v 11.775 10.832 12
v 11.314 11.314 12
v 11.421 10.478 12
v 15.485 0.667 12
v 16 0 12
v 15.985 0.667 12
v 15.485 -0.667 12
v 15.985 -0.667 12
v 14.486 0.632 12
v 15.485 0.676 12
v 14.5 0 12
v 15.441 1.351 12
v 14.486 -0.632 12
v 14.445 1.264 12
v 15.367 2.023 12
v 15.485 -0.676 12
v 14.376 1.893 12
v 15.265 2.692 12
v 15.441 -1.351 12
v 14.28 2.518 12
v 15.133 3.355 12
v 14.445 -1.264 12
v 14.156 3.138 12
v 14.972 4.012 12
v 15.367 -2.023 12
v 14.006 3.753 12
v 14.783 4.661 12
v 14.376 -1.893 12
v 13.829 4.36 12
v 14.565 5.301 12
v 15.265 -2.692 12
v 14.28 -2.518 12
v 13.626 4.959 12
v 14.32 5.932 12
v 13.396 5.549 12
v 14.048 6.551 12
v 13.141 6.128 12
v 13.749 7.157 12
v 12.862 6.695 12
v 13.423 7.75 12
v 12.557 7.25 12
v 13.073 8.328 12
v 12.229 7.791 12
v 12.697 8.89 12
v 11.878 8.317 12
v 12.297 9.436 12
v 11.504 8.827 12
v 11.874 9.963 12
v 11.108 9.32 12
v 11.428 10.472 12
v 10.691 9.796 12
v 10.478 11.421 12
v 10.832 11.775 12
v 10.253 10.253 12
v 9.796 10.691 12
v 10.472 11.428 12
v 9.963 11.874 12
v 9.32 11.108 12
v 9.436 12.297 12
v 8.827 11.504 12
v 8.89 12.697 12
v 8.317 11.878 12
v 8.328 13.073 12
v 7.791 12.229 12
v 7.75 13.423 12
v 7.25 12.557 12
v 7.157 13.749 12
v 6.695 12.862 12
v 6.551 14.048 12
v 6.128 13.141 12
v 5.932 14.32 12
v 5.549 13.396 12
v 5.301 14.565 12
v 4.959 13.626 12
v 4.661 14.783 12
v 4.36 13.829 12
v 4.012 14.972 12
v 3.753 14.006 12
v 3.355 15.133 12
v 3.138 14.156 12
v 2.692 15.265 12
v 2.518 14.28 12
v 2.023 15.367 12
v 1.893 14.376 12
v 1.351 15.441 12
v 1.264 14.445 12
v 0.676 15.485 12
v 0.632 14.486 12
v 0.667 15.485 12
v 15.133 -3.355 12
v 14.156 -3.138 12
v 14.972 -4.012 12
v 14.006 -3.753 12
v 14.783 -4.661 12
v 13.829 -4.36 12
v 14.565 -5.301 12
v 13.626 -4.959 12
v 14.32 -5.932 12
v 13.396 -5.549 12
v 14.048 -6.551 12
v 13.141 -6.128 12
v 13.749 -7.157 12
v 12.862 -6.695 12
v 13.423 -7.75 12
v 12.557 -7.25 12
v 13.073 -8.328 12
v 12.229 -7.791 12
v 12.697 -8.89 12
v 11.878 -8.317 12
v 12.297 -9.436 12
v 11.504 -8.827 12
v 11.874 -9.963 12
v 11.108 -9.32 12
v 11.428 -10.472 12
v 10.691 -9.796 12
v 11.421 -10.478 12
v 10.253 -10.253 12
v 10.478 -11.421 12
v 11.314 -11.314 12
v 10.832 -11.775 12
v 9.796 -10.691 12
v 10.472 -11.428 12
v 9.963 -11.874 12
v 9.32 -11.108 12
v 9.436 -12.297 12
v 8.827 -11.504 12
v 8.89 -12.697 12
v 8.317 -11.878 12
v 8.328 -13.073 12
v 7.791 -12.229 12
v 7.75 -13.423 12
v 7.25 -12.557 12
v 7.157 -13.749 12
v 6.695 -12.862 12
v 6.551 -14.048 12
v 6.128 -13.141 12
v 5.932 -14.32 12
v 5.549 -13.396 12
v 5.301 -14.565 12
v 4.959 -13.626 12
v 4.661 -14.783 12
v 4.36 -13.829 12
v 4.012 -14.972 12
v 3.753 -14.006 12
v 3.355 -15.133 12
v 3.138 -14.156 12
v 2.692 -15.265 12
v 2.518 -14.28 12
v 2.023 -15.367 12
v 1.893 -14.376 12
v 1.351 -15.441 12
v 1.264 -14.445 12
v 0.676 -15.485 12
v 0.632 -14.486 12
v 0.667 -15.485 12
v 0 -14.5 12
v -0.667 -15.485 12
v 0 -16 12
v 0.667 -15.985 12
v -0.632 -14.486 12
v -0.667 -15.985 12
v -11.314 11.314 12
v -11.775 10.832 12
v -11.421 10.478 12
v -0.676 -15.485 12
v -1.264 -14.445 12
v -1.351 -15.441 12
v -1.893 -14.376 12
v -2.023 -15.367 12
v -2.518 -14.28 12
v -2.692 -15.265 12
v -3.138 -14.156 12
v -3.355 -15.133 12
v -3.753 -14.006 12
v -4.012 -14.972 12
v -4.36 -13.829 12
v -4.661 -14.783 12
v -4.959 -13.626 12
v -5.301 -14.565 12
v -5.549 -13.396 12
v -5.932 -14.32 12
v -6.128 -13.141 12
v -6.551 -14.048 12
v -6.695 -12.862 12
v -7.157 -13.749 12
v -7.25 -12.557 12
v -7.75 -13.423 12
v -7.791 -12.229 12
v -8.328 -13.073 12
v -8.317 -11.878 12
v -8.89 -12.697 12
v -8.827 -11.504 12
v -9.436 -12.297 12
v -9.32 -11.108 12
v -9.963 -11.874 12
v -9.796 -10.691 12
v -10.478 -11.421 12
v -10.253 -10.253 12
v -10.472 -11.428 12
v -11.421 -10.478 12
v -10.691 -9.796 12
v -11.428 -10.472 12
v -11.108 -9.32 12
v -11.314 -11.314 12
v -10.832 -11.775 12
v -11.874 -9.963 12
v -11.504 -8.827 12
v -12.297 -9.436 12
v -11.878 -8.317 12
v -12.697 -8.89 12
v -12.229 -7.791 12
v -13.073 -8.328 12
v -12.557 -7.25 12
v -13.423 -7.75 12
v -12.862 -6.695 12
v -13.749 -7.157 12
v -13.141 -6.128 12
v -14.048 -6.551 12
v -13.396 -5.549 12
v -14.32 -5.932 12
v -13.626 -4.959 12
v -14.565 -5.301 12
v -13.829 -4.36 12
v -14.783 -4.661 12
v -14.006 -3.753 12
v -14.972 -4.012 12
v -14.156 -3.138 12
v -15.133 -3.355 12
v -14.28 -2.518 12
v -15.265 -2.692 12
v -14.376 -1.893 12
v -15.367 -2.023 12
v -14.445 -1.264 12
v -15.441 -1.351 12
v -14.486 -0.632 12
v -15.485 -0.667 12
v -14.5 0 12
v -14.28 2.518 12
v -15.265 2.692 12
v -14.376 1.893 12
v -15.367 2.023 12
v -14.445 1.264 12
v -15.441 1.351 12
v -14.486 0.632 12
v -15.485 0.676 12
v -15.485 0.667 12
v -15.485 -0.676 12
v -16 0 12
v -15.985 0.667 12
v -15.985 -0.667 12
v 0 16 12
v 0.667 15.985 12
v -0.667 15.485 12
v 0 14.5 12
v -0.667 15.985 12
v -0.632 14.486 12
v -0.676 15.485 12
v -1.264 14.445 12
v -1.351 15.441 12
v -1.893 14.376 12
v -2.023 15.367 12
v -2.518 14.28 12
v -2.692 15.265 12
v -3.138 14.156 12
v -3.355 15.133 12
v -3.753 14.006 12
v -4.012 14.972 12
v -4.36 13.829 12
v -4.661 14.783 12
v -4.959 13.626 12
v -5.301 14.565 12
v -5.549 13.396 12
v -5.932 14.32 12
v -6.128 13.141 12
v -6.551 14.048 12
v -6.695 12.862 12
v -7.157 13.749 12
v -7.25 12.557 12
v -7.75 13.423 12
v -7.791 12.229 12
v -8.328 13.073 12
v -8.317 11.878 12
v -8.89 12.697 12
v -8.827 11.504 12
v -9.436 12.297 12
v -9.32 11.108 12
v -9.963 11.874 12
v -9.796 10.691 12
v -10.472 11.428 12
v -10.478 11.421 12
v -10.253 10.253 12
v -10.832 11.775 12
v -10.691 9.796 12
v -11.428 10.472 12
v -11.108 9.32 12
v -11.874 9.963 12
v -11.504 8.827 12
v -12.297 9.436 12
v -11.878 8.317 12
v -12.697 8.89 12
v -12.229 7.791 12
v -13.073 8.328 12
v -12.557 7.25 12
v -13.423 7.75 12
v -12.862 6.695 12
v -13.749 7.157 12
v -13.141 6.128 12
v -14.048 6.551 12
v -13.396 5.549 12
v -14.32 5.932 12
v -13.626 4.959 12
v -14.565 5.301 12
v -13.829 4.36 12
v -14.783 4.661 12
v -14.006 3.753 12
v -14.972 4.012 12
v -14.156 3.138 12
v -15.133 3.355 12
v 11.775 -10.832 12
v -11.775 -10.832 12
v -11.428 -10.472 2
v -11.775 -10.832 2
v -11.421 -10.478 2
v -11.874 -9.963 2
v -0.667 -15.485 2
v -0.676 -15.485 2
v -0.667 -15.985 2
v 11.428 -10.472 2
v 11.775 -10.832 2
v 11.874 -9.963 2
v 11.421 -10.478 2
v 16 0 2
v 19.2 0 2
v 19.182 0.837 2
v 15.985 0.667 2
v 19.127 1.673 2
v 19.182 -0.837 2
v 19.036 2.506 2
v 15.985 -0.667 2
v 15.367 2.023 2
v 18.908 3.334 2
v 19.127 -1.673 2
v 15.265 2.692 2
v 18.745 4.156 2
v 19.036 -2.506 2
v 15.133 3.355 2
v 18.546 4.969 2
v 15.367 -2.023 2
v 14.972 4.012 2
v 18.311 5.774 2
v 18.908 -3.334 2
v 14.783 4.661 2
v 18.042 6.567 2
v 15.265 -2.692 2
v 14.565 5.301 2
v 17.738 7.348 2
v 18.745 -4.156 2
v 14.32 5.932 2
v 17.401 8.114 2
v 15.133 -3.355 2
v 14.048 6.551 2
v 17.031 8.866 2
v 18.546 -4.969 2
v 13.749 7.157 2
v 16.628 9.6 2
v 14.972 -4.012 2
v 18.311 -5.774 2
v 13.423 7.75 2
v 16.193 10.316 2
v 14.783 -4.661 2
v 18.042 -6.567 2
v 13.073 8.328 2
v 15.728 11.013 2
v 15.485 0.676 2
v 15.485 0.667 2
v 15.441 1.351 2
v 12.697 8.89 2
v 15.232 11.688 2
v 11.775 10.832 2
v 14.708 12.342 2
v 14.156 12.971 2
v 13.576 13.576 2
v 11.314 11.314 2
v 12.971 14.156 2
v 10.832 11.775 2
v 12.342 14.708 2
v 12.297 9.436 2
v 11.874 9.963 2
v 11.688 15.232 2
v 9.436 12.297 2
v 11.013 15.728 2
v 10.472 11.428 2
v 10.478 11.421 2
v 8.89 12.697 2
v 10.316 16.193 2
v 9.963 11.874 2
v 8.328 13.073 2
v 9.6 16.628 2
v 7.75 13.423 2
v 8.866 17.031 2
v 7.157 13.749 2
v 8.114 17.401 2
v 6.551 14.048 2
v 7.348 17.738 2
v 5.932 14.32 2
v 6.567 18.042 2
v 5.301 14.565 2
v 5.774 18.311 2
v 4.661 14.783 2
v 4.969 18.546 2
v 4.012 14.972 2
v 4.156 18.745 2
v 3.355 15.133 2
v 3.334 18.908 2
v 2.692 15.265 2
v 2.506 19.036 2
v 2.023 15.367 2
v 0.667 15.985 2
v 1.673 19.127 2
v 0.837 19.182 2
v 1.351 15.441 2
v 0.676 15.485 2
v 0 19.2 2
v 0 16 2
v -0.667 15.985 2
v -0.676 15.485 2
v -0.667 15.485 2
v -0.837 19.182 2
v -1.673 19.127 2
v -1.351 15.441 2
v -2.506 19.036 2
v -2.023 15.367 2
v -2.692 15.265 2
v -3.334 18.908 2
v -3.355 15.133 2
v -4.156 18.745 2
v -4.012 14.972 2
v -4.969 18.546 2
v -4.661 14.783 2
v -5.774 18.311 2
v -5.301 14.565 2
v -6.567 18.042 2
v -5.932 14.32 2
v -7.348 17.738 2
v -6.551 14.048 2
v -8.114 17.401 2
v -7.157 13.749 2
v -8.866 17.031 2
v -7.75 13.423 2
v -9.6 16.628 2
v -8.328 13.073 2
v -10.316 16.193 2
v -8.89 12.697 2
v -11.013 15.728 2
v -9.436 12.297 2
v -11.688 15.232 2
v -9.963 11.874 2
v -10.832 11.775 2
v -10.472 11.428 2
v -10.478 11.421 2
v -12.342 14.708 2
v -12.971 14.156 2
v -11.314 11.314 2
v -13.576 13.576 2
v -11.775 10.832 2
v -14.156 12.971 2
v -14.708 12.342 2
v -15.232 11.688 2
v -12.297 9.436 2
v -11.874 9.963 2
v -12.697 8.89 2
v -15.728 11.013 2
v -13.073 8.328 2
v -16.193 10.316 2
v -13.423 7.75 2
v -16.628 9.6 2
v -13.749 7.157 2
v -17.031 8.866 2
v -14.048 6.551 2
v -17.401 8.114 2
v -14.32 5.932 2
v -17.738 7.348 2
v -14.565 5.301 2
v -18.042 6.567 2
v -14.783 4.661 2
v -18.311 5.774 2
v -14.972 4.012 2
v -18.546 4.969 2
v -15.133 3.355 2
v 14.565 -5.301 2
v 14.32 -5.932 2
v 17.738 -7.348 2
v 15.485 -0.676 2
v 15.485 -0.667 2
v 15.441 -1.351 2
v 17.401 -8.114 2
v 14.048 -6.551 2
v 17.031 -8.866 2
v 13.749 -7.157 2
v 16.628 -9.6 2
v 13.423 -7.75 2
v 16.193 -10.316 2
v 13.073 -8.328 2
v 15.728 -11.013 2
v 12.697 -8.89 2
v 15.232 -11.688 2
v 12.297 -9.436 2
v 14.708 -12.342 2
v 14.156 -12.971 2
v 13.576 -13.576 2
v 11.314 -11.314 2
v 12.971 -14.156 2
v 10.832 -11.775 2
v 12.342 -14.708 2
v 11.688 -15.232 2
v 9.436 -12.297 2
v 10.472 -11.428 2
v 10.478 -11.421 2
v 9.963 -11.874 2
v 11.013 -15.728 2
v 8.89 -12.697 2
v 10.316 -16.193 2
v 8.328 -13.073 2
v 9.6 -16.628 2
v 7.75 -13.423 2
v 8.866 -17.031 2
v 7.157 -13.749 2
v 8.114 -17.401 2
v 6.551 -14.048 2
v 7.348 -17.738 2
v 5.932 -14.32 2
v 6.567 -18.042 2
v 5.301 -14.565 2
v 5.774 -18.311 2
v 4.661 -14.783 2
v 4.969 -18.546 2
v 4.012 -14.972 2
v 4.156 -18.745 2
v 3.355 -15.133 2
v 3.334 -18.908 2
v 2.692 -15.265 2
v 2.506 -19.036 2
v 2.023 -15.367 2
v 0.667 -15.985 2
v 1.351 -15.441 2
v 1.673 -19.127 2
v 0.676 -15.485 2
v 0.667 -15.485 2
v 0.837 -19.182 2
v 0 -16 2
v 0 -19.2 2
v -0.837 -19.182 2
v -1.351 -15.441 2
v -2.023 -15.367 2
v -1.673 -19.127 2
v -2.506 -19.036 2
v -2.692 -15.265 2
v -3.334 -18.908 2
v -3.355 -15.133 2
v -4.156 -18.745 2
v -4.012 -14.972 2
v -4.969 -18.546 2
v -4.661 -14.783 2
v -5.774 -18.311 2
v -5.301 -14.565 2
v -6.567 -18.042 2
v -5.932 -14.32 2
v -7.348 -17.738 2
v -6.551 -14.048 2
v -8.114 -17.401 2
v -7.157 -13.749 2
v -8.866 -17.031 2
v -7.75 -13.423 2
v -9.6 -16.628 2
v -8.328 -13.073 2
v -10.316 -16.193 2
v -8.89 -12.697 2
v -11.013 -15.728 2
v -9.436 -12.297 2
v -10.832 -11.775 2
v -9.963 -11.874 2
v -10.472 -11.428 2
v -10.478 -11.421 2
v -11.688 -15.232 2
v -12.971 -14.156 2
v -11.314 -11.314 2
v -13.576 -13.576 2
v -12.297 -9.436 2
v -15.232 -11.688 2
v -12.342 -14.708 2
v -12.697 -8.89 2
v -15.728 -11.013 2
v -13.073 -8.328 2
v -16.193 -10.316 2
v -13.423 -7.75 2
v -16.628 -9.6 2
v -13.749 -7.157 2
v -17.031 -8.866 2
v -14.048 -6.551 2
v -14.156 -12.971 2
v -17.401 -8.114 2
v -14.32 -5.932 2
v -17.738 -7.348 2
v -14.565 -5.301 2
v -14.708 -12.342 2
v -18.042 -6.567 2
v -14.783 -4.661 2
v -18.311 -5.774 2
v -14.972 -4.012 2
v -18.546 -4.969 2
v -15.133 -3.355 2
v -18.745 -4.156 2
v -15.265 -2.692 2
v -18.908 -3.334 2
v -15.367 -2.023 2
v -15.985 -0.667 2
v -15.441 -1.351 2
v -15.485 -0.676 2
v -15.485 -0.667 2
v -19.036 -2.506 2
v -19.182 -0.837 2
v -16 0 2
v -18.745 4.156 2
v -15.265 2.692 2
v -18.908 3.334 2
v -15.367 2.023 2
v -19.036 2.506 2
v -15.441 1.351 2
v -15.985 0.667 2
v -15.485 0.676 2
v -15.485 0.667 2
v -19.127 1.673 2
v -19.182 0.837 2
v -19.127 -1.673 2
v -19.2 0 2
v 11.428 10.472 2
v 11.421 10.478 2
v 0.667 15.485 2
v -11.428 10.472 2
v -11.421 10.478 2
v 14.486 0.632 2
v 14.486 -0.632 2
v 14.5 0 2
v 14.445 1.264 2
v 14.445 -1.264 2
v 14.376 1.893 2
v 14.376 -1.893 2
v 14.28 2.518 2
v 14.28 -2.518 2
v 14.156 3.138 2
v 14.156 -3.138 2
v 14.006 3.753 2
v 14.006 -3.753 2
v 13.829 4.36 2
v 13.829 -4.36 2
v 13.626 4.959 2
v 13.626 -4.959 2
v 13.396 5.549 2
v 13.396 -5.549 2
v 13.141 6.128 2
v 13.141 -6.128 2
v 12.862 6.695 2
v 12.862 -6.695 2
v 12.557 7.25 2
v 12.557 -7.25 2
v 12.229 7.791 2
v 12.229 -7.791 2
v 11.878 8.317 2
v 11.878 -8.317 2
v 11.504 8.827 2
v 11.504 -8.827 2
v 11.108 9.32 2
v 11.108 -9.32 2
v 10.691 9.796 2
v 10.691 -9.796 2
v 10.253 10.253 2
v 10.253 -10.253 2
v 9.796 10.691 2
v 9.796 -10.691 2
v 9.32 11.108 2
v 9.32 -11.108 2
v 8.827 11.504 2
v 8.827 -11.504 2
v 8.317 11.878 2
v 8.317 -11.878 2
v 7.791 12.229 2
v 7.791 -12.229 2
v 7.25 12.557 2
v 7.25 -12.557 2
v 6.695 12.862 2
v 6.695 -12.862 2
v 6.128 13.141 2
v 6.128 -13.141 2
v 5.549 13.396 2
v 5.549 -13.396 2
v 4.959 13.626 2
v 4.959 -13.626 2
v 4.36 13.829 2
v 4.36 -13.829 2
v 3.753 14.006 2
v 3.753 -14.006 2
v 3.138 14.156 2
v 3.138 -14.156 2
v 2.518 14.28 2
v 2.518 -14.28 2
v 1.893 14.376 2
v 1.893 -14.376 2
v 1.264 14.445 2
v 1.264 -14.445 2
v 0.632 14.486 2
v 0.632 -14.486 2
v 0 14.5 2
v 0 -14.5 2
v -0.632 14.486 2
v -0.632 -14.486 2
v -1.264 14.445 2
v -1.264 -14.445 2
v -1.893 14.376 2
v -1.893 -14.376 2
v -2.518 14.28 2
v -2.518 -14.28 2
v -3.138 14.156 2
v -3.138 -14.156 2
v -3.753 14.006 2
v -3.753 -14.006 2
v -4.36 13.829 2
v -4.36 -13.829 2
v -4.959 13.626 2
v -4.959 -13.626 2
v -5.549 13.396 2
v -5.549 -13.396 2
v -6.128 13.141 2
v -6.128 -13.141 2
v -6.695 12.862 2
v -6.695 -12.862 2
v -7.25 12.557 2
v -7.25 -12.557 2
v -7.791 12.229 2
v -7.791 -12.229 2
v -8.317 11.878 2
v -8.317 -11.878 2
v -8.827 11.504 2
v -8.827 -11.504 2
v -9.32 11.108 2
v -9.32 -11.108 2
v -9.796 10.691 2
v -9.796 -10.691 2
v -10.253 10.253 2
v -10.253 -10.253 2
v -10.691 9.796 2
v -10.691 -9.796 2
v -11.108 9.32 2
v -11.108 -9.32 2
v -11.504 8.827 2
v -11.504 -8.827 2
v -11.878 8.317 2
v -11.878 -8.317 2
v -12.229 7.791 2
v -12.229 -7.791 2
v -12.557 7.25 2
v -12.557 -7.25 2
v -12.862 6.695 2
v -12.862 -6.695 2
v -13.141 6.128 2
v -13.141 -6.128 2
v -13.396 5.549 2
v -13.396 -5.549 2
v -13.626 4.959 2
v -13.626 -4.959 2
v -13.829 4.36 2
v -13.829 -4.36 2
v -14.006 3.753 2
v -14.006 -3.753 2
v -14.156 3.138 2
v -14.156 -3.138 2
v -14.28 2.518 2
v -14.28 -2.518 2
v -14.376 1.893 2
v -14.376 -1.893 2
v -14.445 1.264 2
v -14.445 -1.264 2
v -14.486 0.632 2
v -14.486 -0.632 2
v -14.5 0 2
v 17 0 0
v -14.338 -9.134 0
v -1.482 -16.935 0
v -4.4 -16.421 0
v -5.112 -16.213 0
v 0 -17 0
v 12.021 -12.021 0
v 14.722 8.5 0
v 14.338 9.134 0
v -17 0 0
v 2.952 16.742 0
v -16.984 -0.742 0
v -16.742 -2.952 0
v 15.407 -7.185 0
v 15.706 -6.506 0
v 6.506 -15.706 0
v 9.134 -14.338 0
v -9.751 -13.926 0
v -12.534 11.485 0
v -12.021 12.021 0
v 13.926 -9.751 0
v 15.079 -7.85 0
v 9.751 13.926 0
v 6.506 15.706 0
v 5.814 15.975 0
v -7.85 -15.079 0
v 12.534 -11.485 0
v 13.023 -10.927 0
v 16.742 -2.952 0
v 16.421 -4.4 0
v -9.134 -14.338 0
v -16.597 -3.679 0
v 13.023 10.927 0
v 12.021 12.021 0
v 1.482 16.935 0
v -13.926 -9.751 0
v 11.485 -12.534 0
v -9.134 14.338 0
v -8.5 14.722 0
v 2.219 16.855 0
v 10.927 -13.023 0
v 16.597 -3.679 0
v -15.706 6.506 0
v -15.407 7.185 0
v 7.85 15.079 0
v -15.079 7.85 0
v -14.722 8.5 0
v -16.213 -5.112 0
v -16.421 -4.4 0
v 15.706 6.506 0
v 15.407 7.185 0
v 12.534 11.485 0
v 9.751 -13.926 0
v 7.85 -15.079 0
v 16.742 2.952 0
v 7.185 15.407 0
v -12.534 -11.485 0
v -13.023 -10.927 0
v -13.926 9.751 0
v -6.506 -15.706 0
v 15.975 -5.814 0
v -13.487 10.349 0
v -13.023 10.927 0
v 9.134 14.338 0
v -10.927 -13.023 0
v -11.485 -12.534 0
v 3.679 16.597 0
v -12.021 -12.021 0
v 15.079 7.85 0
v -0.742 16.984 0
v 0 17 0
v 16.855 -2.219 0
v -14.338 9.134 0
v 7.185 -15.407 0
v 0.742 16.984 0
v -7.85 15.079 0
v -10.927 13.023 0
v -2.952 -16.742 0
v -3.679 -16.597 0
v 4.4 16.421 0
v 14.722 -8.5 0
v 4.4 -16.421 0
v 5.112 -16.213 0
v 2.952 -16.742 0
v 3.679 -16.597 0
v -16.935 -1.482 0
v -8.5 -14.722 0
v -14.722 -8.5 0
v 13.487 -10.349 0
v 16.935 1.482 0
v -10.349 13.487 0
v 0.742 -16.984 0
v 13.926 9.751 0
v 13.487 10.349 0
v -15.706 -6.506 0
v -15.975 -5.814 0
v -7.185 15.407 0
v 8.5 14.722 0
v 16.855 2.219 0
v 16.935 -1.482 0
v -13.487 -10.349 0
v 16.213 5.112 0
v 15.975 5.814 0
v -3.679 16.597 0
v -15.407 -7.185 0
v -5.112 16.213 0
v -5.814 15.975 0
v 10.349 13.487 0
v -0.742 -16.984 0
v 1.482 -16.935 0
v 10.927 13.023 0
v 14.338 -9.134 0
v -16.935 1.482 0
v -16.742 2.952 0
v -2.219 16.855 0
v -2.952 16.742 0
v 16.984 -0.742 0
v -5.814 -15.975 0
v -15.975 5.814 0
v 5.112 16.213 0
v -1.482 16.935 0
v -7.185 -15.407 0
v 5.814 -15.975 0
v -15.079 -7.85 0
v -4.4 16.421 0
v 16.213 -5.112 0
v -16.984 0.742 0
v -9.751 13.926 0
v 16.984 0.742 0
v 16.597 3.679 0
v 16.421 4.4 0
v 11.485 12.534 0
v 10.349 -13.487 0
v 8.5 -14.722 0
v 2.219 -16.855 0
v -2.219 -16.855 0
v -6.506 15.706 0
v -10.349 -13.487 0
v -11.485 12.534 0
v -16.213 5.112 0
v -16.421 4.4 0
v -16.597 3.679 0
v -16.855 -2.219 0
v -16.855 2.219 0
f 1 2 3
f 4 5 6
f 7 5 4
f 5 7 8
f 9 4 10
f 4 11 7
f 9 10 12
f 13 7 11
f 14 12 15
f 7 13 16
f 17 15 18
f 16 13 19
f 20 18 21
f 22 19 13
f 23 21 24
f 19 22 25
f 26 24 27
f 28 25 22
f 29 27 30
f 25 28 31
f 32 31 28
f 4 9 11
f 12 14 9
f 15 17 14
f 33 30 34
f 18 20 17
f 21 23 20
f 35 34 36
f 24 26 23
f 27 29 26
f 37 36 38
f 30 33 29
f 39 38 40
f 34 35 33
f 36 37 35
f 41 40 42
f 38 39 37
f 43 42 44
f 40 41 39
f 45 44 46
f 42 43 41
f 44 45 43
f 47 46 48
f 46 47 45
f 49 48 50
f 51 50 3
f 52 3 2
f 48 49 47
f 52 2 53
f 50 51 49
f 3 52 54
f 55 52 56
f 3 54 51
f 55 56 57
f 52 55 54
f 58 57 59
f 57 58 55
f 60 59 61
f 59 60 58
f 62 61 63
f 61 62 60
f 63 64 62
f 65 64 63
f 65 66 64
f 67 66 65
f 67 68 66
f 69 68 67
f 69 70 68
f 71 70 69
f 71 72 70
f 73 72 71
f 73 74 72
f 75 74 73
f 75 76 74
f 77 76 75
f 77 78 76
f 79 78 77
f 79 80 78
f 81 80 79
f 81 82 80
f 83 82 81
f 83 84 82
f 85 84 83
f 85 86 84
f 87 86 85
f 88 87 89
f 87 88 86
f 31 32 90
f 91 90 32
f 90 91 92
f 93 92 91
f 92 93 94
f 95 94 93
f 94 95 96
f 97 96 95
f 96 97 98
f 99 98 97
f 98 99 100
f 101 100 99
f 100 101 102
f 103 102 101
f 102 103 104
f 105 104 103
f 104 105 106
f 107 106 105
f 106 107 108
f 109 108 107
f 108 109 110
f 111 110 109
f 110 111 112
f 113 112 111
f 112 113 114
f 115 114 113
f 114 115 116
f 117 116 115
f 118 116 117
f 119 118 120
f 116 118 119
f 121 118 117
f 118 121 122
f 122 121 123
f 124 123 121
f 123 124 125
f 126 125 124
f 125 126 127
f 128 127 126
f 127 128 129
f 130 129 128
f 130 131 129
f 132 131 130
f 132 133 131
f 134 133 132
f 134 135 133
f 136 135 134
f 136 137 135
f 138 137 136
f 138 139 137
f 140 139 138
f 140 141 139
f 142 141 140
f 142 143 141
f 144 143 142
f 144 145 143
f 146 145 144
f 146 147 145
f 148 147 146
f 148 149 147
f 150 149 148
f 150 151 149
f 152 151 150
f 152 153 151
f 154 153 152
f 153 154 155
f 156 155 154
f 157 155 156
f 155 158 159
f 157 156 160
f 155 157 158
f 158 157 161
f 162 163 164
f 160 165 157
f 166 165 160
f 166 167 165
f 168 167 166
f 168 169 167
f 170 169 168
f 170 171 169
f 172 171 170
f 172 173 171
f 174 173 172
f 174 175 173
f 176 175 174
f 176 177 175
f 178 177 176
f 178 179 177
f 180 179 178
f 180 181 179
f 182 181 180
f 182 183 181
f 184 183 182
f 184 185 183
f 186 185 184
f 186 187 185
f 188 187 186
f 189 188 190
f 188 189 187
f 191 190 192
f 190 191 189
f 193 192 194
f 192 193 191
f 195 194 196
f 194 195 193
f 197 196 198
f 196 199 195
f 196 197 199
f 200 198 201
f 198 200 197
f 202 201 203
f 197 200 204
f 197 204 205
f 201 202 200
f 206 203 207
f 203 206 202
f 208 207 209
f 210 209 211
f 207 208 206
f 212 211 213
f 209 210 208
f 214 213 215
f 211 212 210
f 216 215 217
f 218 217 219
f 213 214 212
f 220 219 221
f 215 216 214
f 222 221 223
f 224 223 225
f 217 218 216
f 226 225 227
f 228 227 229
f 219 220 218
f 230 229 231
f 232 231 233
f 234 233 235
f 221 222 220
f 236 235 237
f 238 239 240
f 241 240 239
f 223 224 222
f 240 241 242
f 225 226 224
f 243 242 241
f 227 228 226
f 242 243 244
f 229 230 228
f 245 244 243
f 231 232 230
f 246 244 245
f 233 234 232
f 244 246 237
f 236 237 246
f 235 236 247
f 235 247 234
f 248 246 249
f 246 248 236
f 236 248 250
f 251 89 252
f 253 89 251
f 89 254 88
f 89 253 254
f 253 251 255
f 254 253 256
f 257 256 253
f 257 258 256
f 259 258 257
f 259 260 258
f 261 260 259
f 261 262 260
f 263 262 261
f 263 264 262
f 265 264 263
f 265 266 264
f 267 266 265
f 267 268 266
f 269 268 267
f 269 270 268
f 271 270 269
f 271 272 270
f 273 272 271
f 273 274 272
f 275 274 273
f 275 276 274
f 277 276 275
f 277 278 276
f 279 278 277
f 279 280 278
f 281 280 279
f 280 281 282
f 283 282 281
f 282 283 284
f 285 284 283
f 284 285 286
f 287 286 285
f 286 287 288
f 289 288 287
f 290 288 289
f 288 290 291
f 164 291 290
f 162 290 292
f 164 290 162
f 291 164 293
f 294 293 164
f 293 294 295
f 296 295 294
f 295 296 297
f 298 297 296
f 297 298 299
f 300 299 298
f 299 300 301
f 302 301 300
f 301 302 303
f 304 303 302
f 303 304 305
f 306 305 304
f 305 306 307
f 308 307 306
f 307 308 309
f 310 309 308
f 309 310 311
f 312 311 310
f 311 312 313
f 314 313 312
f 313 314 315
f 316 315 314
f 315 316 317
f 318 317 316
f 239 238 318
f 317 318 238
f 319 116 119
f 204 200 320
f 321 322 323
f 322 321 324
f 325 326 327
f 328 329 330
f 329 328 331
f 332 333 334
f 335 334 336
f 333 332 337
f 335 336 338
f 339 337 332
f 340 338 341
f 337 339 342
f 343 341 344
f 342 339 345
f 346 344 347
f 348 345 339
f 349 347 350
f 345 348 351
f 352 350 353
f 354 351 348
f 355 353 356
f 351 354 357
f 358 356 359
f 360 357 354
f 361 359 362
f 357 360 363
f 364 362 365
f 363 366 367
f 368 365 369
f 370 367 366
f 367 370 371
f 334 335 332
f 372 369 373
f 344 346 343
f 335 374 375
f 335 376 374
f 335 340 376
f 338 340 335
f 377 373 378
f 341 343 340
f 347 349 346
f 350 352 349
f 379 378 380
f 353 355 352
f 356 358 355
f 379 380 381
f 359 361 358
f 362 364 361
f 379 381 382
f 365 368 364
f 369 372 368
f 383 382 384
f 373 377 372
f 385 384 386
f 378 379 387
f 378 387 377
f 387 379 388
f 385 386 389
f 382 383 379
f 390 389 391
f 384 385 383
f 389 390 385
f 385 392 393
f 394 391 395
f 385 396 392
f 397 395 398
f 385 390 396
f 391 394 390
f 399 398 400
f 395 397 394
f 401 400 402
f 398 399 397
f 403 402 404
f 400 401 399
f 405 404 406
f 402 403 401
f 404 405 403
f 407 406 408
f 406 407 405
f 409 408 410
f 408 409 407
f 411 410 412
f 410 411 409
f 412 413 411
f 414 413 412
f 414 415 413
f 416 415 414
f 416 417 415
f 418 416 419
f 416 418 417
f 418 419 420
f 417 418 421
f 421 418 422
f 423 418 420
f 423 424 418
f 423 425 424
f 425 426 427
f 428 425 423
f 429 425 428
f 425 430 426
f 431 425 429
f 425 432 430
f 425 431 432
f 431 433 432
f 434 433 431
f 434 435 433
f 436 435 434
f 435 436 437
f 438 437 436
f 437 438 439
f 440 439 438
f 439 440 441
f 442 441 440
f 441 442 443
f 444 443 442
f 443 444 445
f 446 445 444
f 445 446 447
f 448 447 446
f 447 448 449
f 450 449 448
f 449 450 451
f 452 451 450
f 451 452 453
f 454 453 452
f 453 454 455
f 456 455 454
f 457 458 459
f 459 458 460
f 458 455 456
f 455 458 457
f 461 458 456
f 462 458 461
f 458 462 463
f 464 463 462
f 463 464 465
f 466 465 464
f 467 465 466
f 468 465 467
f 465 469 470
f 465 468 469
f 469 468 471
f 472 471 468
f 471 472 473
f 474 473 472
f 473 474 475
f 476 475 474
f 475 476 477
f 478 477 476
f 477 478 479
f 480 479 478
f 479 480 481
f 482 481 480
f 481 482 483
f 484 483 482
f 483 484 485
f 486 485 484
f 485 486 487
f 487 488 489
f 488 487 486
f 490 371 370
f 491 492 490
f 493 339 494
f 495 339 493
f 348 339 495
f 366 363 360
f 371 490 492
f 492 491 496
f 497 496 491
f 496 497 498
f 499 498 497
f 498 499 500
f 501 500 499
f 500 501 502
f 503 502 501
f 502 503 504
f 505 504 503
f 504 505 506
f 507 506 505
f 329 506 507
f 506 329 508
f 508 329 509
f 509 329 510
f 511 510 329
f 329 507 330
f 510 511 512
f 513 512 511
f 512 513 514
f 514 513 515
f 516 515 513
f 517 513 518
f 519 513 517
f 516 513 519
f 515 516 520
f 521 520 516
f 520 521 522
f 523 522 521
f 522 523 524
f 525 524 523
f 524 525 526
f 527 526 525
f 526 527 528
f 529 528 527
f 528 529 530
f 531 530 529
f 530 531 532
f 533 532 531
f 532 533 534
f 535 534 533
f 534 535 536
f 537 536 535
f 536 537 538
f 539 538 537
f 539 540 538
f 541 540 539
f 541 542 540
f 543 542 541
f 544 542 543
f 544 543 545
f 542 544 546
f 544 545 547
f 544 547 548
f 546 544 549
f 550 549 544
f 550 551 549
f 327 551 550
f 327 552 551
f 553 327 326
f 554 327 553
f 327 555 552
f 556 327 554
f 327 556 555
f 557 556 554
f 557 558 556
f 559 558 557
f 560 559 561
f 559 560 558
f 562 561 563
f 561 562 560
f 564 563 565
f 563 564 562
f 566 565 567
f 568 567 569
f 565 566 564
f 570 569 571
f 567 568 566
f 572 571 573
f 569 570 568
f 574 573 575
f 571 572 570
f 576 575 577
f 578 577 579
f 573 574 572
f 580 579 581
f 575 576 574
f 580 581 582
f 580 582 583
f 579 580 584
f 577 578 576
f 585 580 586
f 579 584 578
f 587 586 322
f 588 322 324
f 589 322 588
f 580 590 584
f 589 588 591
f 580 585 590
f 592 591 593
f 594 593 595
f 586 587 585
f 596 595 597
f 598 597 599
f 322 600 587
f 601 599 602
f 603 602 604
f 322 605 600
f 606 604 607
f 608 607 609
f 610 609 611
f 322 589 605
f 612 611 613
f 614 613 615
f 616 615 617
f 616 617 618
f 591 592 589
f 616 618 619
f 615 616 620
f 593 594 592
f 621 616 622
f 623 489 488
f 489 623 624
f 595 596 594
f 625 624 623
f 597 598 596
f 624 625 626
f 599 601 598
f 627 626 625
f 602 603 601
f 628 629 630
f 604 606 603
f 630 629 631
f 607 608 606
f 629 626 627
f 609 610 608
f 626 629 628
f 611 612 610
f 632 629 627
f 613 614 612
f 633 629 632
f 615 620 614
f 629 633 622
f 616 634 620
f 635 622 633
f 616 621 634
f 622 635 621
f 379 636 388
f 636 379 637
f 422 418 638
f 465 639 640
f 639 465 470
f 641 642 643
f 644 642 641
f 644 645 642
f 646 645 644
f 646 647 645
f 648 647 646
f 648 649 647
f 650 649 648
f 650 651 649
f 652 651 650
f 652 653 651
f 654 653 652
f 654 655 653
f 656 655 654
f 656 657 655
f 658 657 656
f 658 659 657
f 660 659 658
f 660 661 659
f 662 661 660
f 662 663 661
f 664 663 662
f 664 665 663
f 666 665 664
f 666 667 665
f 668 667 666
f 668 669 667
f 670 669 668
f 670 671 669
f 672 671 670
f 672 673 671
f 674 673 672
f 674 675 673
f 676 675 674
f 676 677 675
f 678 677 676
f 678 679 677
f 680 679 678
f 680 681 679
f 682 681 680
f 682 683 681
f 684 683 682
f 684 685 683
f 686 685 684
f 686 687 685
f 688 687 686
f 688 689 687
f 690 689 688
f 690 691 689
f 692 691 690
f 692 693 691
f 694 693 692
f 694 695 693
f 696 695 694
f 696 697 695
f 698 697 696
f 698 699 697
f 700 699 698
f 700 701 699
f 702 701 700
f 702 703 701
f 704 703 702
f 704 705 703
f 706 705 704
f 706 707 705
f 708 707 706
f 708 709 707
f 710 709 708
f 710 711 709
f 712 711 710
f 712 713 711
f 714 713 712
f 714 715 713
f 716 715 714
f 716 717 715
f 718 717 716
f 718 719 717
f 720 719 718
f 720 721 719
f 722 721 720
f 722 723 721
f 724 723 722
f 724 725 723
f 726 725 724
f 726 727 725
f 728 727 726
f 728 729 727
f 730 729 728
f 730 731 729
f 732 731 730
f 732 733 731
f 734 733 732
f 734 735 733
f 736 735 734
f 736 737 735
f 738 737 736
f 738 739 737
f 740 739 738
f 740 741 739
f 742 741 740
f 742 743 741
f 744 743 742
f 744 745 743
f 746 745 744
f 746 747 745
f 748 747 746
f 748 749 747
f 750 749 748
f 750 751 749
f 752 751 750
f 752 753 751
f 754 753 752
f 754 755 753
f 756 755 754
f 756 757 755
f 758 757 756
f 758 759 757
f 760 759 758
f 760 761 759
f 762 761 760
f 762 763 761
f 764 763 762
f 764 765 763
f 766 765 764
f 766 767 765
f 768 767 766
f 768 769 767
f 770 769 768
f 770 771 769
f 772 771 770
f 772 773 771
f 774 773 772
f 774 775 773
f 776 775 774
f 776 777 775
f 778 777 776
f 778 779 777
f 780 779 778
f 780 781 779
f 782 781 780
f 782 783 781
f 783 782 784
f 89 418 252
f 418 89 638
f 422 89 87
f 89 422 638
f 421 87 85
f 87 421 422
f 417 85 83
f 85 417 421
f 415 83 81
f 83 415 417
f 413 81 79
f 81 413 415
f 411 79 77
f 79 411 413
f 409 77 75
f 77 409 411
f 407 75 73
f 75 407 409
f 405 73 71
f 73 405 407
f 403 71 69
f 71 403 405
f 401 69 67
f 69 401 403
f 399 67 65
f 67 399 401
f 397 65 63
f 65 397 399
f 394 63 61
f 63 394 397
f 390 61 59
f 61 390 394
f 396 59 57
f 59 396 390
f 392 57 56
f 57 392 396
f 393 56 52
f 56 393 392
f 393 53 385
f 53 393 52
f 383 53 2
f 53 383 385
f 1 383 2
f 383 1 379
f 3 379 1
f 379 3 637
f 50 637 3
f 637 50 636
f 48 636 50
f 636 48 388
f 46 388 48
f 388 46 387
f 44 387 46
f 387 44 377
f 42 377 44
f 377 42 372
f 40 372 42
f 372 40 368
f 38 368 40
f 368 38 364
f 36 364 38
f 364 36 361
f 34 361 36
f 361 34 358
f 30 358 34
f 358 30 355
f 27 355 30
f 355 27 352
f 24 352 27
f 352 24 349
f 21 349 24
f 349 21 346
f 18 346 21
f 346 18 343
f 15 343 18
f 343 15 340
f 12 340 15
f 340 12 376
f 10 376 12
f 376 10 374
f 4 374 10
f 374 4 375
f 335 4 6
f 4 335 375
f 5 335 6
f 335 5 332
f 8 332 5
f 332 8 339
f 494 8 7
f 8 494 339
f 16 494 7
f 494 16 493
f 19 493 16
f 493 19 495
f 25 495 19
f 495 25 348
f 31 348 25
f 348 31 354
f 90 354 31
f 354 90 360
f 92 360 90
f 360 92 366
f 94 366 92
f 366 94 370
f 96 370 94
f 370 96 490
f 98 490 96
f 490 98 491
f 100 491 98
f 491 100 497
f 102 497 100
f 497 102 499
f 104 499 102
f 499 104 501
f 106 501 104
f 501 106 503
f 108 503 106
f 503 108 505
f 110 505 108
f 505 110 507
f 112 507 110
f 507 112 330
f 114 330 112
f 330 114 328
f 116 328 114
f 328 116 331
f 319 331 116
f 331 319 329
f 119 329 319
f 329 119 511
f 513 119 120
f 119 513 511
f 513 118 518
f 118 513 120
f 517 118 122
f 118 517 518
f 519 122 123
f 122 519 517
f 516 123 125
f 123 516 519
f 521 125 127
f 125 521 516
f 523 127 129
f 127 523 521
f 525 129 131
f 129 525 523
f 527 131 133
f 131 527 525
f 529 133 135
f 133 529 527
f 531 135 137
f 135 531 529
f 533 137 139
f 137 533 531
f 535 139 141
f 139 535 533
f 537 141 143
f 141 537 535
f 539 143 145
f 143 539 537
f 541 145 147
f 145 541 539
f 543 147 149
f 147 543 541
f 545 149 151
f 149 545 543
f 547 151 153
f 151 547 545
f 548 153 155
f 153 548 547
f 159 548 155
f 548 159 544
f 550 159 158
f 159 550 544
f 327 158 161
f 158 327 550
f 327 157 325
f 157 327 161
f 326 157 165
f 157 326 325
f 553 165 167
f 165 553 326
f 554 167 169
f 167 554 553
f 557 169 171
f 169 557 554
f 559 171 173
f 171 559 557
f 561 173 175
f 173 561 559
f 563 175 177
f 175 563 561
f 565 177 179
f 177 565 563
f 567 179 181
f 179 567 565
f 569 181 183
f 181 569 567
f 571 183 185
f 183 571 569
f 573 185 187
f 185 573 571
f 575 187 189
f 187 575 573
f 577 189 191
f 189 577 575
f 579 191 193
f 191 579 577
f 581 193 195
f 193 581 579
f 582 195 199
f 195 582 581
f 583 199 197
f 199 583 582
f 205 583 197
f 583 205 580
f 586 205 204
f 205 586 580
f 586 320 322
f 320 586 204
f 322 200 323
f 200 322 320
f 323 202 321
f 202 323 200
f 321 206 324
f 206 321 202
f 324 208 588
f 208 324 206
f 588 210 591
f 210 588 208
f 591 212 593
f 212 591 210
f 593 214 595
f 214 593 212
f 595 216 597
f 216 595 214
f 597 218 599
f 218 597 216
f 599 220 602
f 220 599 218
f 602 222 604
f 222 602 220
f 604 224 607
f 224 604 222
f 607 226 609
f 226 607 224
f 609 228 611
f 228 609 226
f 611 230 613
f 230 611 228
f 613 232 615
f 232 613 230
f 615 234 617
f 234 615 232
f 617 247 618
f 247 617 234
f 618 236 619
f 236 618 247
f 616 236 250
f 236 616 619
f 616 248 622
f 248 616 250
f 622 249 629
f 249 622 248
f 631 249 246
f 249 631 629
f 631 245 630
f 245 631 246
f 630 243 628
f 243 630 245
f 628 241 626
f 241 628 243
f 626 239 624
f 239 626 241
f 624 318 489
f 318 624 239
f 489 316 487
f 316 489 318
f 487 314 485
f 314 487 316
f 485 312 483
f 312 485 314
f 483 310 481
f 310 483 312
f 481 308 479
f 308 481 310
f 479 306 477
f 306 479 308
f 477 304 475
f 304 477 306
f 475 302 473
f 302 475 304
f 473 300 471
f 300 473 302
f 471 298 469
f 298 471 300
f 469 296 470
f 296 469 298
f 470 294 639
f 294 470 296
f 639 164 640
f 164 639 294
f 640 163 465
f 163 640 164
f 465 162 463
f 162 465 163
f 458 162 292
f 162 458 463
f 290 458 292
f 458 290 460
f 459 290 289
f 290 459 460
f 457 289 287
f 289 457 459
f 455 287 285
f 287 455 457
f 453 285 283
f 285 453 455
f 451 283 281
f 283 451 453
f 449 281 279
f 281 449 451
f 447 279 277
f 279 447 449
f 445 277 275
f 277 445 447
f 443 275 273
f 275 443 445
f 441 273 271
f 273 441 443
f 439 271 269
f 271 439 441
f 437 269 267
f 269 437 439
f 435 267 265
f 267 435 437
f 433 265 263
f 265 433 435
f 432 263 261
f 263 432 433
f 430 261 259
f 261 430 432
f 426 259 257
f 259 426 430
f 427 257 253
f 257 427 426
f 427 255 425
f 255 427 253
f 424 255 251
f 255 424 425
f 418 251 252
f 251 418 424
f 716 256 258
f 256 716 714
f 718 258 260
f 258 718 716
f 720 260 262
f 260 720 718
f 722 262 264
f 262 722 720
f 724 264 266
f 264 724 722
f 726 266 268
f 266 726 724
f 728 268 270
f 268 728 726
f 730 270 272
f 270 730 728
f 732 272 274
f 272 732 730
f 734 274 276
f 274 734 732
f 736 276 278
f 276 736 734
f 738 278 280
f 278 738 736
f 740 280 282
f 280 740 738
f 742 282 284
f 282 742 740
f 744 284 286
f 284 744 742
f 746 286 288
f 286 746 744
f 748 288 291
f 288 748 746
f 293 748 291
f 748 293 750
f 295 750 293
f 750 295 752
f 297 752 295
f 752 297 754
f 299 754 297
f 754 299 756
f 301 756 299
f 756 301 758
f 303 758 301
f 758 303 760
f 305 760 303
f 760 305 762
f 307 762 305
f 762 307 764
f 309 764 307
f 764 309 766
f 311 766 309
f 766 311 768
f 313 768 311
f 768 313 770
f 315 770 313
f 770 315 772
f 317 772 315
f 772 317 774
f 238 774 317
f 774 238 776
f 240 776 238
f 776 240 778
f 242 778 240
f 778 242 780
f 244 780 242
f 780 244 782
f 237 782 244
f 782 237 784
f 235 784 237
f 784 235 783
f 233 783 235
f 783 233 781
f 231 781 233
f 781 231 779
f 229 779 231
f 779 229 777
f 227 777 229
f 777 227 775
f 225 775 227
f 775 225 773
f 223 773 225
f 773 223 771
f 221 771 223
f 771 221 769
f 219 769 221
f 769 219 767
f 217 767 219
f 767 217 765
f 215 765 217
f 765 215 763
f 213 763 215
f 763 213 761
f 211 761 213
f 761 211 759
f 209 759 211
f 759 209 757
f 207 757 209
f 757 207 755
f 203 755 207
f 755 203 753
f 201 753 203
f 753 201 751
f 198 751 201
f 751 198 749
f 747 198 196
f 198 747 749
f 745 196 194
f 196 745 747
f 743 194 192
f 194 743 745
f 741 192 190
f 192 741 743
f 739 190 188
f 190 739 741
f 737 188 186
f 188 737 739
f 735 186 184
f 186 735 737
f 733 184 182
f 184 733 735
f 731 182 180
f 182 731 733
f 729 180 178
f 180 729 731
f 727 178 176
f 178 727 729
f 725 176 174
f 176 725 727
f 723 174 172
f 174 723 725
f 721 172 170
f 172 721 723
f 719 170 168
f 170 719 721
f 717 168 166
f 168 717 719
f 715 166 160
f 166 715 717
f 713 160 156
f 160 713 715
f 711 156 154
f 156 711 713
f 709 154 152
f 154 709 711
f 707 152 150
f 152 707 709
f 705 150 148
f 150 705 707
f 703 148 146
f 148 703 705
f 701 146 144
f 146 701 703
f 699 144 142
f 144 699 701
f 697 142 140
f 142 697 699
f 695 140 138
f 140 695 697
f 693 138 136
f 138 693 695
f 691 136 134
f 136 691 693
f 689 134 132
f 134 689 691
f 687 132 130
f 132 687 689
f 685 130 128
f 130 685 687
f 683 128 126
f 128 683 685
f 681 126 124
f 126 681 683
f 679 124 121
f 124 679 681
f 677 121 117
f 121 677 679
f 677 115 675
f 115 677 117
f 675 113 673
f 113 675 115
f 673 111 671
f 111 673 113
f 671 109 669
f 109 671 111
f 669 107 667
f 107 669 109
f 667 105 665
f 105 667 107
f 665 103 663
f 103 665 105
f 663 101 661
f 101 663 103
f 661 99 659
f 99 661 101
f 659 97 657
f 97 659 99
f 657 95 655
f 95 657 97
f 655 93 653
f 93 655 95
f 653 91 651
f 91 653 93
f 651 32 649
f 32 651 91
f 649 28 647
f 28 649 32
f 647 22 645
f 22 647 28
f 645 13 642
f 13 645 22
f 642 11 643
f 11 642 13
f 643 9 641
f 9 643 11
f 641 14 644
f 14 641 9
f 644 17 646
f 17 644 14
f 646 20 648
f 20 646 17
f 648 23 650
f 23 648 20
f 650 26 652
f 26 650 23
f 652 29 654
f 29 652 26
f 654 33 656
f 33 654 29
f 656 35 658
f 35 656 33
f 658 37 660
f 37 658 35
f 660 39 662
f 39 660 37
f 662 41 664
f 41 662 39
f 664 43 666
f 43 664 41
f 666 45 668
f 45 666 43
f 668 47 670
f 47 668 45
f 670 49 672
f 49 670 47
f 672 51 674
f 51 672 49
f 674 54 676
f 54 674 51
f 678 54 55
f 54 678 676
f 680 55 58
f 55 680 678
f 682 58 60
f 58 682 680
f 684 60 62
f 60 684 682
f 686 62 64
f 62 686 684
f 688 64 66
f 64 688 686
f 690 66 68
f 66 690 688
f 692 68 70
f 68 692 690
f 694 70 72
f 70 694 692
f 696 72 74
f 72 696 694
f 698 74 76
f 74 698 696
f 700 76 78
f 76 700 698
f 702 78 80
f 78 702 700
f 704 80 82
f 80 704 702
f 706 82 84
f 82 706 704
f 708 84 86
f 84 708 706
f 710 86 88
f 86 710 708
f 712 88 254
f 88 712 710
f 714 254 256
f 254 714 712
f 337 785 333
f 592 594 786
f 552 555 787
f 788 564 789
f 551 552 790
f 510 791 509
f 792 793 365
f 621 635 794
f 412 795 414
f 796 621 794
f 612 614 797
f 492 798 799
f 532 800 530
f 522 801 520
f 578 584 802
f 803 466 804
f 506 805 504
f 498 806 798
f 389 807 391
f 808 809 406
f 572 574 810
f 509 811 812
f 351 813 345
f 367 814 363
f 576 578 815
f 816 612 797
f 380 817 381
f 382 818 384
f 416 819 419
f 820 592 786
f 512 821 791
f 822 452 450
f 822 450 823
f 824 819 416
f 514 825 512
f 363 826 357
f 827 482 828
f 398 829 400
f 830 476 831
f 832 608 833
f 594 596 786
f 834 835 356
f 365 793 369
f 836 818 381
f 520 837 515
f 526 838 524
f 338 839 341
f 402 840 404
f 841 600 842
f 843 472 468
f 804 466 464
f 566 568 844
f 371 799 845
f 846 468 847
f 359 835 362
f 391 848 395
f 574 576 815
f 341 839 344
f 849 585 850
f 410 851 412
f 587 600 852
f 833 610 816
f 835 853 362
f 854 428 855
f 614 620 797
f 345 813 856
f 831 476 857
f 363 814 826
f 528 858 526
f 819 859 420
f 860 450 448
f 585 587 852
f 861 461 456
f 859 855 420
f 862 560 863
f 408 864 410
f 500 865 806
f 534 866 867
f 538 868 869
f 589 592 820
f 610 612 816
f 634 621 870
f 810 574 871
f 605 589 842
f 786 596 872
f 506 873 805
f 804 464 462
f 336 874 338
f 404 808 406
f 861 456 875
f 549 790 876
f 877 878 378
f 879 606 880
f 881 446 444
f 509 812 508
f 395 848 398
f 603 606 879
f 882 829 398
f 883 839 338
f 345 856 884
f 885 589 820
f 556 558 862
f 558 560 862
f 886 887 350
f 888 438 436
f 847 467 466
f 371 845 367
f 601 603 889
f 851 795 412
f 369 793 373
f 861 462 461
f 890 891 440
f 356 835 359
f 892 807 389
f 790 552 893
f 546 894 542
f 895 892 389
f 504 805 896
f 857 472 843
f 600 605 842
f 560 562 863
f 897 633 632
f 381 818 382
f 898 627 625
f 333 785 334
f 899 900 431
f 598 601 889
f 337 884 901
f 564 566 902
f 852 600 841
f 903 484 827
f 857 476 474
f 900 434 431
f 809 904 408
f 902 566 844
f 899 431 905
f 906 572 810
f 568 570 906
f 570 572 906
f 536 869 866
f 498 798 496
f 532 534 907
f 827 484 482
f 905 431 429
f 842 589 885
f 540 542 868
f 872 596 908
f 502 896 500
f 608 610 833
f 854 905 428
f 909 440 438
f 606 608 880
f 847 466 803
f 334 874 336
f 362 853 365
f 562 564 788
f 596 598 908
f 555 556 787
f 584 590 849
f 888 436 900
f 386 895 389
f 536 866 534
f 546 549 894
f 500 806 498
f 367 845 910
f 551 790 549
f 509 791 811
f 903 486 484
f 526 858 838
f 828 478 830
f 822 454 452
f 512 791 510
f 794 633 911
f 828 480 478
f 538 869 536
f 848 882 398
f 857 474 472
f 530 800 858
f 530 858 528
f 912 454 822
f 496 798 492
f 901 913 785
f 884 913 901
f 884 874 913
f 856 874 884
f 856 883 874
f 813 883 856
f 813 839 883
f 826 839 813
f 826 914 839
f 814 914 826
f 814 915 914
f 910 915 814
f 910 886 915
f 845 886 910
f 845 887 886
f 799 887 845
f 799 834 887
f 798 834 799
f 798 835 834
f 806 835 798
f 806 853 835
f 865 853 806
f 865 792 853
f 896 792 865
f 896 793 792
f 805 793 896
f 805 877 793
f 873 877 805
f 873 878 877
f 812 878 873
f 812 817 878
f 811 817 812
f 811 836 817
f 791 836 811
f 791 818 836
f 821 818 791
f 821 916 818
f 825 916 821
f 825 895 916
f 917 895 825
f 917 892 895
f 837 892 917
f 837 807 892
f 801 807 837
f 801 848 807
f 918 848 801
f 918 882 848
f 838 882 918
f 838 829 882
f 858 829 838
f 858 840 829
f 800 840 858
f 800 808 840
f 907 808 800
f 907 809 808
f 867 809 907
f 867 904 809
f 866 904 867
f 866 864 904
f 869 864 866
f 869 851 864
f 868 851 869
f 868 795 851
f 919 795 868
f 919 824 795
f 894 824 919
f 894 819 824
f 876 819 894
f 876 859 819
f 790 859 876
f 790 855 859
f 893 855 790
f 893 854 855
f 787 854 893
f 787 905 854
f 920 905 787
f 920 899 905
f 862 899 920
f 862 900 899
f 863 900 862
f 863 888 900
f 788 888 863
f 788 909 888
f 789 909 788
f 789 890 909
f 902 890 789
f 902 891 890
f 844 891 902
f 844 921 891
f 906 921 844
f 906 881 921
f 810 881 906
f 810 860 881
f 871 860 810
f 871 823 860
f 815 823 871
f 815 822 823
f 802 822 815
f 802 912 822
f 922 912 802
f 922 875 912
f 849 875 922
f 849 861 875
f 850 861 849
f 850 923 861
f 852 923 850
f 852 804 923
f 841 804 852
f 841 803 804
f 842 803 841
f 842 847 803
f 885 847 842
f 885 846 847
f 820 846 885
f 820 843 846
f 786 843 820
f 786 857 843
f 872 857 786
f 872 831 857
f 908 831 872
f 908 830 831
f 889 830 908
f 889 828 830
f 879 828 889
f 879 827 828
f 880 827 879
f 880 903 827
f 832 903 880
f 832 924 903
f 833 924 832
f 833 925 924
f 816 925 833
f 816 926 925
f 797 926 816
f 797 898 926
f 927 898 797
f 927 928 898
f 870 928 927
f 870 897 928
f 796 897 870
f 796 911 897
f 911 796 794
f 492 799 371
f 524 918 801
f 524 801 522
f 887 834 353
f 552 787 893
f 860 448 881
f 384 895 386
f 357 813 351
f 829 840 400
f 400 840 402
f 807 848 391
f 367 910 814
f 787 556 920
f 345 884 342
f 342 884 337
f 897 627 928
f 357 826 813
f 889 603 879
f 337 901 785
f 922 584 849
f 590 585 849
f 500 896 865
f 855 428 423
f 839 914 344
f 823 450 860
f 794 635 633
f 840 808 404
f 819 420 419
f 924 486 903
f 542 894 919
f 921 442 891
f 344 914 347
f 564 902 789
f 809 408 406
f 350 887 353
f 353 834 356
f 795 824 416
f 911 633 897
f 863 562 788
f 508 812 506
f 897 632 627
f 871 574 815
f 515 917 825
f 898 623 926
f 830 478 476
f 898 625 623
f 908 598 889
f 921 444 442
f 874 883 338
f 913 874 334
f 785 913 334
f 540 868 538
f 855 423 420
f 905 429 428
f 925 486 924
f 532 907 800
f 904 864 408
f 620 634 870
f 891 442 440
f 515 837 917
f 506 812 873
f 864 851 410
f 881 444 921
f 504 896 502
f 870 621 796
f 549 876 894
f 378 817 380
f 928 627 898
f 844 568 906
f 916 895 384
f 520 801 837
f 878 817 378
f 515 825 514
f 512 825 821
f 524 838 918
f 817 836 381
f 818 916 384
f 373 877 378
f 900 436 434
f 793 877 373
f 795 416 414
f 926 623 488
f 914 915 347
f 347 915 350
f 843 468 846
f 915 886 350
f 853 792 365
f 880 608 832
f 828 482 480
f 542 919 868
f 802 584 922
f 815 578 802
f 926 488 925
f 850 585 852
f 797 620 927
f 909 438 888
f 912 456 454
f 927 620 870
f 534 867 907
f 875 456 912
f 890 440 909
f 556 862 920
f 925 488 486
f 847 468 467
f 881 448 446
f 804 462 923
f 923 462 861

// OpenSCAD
//External Diameter (equal to the diameter of the hole where you'll insert this cap)
Diameter=32; // [1:100]

//Teeth protruding
TeethExt=1; // [0.1:0.1:10]

//How much teeth?
TeethExtCount=8; // [0:36]

//Thickness of the cylinder's perimeter that will be in the hole
Thickness=2; // [0.1:0.1:10]

//Height of the part that will be inserted in the hole
Height=10; // [0.1:0.1:100]

/* [Hidden] */
//Segments number in circles
Segments=144;

translate([0,0,Height+Diameter/16])
rotate([180,0,0])
union(){
    linear_extrude(height=Height, convexity=10)
    difference(){
        intersection(){
            union(){
                circle($fn=Segments,d=Diameter-TeethExt);
                for(r=[0:360/TeethExtCount:360])
                    rotate(a=r, v=[0,0,1])
                        square(size=[Diameter/24, Diameter*1.5], center=true);
                
            }
            circle($fn=Segments,d=Diameter);
        }
        circle($fn=Segments,d=Diameter-Thickness-TeethExt);
    }
    translate([0,0,Height])
        cylinder($fn=Segments,h=Diameter/16, d1=Diameter+Diameter/5, d2=Diameter+Diameter/16);
}
